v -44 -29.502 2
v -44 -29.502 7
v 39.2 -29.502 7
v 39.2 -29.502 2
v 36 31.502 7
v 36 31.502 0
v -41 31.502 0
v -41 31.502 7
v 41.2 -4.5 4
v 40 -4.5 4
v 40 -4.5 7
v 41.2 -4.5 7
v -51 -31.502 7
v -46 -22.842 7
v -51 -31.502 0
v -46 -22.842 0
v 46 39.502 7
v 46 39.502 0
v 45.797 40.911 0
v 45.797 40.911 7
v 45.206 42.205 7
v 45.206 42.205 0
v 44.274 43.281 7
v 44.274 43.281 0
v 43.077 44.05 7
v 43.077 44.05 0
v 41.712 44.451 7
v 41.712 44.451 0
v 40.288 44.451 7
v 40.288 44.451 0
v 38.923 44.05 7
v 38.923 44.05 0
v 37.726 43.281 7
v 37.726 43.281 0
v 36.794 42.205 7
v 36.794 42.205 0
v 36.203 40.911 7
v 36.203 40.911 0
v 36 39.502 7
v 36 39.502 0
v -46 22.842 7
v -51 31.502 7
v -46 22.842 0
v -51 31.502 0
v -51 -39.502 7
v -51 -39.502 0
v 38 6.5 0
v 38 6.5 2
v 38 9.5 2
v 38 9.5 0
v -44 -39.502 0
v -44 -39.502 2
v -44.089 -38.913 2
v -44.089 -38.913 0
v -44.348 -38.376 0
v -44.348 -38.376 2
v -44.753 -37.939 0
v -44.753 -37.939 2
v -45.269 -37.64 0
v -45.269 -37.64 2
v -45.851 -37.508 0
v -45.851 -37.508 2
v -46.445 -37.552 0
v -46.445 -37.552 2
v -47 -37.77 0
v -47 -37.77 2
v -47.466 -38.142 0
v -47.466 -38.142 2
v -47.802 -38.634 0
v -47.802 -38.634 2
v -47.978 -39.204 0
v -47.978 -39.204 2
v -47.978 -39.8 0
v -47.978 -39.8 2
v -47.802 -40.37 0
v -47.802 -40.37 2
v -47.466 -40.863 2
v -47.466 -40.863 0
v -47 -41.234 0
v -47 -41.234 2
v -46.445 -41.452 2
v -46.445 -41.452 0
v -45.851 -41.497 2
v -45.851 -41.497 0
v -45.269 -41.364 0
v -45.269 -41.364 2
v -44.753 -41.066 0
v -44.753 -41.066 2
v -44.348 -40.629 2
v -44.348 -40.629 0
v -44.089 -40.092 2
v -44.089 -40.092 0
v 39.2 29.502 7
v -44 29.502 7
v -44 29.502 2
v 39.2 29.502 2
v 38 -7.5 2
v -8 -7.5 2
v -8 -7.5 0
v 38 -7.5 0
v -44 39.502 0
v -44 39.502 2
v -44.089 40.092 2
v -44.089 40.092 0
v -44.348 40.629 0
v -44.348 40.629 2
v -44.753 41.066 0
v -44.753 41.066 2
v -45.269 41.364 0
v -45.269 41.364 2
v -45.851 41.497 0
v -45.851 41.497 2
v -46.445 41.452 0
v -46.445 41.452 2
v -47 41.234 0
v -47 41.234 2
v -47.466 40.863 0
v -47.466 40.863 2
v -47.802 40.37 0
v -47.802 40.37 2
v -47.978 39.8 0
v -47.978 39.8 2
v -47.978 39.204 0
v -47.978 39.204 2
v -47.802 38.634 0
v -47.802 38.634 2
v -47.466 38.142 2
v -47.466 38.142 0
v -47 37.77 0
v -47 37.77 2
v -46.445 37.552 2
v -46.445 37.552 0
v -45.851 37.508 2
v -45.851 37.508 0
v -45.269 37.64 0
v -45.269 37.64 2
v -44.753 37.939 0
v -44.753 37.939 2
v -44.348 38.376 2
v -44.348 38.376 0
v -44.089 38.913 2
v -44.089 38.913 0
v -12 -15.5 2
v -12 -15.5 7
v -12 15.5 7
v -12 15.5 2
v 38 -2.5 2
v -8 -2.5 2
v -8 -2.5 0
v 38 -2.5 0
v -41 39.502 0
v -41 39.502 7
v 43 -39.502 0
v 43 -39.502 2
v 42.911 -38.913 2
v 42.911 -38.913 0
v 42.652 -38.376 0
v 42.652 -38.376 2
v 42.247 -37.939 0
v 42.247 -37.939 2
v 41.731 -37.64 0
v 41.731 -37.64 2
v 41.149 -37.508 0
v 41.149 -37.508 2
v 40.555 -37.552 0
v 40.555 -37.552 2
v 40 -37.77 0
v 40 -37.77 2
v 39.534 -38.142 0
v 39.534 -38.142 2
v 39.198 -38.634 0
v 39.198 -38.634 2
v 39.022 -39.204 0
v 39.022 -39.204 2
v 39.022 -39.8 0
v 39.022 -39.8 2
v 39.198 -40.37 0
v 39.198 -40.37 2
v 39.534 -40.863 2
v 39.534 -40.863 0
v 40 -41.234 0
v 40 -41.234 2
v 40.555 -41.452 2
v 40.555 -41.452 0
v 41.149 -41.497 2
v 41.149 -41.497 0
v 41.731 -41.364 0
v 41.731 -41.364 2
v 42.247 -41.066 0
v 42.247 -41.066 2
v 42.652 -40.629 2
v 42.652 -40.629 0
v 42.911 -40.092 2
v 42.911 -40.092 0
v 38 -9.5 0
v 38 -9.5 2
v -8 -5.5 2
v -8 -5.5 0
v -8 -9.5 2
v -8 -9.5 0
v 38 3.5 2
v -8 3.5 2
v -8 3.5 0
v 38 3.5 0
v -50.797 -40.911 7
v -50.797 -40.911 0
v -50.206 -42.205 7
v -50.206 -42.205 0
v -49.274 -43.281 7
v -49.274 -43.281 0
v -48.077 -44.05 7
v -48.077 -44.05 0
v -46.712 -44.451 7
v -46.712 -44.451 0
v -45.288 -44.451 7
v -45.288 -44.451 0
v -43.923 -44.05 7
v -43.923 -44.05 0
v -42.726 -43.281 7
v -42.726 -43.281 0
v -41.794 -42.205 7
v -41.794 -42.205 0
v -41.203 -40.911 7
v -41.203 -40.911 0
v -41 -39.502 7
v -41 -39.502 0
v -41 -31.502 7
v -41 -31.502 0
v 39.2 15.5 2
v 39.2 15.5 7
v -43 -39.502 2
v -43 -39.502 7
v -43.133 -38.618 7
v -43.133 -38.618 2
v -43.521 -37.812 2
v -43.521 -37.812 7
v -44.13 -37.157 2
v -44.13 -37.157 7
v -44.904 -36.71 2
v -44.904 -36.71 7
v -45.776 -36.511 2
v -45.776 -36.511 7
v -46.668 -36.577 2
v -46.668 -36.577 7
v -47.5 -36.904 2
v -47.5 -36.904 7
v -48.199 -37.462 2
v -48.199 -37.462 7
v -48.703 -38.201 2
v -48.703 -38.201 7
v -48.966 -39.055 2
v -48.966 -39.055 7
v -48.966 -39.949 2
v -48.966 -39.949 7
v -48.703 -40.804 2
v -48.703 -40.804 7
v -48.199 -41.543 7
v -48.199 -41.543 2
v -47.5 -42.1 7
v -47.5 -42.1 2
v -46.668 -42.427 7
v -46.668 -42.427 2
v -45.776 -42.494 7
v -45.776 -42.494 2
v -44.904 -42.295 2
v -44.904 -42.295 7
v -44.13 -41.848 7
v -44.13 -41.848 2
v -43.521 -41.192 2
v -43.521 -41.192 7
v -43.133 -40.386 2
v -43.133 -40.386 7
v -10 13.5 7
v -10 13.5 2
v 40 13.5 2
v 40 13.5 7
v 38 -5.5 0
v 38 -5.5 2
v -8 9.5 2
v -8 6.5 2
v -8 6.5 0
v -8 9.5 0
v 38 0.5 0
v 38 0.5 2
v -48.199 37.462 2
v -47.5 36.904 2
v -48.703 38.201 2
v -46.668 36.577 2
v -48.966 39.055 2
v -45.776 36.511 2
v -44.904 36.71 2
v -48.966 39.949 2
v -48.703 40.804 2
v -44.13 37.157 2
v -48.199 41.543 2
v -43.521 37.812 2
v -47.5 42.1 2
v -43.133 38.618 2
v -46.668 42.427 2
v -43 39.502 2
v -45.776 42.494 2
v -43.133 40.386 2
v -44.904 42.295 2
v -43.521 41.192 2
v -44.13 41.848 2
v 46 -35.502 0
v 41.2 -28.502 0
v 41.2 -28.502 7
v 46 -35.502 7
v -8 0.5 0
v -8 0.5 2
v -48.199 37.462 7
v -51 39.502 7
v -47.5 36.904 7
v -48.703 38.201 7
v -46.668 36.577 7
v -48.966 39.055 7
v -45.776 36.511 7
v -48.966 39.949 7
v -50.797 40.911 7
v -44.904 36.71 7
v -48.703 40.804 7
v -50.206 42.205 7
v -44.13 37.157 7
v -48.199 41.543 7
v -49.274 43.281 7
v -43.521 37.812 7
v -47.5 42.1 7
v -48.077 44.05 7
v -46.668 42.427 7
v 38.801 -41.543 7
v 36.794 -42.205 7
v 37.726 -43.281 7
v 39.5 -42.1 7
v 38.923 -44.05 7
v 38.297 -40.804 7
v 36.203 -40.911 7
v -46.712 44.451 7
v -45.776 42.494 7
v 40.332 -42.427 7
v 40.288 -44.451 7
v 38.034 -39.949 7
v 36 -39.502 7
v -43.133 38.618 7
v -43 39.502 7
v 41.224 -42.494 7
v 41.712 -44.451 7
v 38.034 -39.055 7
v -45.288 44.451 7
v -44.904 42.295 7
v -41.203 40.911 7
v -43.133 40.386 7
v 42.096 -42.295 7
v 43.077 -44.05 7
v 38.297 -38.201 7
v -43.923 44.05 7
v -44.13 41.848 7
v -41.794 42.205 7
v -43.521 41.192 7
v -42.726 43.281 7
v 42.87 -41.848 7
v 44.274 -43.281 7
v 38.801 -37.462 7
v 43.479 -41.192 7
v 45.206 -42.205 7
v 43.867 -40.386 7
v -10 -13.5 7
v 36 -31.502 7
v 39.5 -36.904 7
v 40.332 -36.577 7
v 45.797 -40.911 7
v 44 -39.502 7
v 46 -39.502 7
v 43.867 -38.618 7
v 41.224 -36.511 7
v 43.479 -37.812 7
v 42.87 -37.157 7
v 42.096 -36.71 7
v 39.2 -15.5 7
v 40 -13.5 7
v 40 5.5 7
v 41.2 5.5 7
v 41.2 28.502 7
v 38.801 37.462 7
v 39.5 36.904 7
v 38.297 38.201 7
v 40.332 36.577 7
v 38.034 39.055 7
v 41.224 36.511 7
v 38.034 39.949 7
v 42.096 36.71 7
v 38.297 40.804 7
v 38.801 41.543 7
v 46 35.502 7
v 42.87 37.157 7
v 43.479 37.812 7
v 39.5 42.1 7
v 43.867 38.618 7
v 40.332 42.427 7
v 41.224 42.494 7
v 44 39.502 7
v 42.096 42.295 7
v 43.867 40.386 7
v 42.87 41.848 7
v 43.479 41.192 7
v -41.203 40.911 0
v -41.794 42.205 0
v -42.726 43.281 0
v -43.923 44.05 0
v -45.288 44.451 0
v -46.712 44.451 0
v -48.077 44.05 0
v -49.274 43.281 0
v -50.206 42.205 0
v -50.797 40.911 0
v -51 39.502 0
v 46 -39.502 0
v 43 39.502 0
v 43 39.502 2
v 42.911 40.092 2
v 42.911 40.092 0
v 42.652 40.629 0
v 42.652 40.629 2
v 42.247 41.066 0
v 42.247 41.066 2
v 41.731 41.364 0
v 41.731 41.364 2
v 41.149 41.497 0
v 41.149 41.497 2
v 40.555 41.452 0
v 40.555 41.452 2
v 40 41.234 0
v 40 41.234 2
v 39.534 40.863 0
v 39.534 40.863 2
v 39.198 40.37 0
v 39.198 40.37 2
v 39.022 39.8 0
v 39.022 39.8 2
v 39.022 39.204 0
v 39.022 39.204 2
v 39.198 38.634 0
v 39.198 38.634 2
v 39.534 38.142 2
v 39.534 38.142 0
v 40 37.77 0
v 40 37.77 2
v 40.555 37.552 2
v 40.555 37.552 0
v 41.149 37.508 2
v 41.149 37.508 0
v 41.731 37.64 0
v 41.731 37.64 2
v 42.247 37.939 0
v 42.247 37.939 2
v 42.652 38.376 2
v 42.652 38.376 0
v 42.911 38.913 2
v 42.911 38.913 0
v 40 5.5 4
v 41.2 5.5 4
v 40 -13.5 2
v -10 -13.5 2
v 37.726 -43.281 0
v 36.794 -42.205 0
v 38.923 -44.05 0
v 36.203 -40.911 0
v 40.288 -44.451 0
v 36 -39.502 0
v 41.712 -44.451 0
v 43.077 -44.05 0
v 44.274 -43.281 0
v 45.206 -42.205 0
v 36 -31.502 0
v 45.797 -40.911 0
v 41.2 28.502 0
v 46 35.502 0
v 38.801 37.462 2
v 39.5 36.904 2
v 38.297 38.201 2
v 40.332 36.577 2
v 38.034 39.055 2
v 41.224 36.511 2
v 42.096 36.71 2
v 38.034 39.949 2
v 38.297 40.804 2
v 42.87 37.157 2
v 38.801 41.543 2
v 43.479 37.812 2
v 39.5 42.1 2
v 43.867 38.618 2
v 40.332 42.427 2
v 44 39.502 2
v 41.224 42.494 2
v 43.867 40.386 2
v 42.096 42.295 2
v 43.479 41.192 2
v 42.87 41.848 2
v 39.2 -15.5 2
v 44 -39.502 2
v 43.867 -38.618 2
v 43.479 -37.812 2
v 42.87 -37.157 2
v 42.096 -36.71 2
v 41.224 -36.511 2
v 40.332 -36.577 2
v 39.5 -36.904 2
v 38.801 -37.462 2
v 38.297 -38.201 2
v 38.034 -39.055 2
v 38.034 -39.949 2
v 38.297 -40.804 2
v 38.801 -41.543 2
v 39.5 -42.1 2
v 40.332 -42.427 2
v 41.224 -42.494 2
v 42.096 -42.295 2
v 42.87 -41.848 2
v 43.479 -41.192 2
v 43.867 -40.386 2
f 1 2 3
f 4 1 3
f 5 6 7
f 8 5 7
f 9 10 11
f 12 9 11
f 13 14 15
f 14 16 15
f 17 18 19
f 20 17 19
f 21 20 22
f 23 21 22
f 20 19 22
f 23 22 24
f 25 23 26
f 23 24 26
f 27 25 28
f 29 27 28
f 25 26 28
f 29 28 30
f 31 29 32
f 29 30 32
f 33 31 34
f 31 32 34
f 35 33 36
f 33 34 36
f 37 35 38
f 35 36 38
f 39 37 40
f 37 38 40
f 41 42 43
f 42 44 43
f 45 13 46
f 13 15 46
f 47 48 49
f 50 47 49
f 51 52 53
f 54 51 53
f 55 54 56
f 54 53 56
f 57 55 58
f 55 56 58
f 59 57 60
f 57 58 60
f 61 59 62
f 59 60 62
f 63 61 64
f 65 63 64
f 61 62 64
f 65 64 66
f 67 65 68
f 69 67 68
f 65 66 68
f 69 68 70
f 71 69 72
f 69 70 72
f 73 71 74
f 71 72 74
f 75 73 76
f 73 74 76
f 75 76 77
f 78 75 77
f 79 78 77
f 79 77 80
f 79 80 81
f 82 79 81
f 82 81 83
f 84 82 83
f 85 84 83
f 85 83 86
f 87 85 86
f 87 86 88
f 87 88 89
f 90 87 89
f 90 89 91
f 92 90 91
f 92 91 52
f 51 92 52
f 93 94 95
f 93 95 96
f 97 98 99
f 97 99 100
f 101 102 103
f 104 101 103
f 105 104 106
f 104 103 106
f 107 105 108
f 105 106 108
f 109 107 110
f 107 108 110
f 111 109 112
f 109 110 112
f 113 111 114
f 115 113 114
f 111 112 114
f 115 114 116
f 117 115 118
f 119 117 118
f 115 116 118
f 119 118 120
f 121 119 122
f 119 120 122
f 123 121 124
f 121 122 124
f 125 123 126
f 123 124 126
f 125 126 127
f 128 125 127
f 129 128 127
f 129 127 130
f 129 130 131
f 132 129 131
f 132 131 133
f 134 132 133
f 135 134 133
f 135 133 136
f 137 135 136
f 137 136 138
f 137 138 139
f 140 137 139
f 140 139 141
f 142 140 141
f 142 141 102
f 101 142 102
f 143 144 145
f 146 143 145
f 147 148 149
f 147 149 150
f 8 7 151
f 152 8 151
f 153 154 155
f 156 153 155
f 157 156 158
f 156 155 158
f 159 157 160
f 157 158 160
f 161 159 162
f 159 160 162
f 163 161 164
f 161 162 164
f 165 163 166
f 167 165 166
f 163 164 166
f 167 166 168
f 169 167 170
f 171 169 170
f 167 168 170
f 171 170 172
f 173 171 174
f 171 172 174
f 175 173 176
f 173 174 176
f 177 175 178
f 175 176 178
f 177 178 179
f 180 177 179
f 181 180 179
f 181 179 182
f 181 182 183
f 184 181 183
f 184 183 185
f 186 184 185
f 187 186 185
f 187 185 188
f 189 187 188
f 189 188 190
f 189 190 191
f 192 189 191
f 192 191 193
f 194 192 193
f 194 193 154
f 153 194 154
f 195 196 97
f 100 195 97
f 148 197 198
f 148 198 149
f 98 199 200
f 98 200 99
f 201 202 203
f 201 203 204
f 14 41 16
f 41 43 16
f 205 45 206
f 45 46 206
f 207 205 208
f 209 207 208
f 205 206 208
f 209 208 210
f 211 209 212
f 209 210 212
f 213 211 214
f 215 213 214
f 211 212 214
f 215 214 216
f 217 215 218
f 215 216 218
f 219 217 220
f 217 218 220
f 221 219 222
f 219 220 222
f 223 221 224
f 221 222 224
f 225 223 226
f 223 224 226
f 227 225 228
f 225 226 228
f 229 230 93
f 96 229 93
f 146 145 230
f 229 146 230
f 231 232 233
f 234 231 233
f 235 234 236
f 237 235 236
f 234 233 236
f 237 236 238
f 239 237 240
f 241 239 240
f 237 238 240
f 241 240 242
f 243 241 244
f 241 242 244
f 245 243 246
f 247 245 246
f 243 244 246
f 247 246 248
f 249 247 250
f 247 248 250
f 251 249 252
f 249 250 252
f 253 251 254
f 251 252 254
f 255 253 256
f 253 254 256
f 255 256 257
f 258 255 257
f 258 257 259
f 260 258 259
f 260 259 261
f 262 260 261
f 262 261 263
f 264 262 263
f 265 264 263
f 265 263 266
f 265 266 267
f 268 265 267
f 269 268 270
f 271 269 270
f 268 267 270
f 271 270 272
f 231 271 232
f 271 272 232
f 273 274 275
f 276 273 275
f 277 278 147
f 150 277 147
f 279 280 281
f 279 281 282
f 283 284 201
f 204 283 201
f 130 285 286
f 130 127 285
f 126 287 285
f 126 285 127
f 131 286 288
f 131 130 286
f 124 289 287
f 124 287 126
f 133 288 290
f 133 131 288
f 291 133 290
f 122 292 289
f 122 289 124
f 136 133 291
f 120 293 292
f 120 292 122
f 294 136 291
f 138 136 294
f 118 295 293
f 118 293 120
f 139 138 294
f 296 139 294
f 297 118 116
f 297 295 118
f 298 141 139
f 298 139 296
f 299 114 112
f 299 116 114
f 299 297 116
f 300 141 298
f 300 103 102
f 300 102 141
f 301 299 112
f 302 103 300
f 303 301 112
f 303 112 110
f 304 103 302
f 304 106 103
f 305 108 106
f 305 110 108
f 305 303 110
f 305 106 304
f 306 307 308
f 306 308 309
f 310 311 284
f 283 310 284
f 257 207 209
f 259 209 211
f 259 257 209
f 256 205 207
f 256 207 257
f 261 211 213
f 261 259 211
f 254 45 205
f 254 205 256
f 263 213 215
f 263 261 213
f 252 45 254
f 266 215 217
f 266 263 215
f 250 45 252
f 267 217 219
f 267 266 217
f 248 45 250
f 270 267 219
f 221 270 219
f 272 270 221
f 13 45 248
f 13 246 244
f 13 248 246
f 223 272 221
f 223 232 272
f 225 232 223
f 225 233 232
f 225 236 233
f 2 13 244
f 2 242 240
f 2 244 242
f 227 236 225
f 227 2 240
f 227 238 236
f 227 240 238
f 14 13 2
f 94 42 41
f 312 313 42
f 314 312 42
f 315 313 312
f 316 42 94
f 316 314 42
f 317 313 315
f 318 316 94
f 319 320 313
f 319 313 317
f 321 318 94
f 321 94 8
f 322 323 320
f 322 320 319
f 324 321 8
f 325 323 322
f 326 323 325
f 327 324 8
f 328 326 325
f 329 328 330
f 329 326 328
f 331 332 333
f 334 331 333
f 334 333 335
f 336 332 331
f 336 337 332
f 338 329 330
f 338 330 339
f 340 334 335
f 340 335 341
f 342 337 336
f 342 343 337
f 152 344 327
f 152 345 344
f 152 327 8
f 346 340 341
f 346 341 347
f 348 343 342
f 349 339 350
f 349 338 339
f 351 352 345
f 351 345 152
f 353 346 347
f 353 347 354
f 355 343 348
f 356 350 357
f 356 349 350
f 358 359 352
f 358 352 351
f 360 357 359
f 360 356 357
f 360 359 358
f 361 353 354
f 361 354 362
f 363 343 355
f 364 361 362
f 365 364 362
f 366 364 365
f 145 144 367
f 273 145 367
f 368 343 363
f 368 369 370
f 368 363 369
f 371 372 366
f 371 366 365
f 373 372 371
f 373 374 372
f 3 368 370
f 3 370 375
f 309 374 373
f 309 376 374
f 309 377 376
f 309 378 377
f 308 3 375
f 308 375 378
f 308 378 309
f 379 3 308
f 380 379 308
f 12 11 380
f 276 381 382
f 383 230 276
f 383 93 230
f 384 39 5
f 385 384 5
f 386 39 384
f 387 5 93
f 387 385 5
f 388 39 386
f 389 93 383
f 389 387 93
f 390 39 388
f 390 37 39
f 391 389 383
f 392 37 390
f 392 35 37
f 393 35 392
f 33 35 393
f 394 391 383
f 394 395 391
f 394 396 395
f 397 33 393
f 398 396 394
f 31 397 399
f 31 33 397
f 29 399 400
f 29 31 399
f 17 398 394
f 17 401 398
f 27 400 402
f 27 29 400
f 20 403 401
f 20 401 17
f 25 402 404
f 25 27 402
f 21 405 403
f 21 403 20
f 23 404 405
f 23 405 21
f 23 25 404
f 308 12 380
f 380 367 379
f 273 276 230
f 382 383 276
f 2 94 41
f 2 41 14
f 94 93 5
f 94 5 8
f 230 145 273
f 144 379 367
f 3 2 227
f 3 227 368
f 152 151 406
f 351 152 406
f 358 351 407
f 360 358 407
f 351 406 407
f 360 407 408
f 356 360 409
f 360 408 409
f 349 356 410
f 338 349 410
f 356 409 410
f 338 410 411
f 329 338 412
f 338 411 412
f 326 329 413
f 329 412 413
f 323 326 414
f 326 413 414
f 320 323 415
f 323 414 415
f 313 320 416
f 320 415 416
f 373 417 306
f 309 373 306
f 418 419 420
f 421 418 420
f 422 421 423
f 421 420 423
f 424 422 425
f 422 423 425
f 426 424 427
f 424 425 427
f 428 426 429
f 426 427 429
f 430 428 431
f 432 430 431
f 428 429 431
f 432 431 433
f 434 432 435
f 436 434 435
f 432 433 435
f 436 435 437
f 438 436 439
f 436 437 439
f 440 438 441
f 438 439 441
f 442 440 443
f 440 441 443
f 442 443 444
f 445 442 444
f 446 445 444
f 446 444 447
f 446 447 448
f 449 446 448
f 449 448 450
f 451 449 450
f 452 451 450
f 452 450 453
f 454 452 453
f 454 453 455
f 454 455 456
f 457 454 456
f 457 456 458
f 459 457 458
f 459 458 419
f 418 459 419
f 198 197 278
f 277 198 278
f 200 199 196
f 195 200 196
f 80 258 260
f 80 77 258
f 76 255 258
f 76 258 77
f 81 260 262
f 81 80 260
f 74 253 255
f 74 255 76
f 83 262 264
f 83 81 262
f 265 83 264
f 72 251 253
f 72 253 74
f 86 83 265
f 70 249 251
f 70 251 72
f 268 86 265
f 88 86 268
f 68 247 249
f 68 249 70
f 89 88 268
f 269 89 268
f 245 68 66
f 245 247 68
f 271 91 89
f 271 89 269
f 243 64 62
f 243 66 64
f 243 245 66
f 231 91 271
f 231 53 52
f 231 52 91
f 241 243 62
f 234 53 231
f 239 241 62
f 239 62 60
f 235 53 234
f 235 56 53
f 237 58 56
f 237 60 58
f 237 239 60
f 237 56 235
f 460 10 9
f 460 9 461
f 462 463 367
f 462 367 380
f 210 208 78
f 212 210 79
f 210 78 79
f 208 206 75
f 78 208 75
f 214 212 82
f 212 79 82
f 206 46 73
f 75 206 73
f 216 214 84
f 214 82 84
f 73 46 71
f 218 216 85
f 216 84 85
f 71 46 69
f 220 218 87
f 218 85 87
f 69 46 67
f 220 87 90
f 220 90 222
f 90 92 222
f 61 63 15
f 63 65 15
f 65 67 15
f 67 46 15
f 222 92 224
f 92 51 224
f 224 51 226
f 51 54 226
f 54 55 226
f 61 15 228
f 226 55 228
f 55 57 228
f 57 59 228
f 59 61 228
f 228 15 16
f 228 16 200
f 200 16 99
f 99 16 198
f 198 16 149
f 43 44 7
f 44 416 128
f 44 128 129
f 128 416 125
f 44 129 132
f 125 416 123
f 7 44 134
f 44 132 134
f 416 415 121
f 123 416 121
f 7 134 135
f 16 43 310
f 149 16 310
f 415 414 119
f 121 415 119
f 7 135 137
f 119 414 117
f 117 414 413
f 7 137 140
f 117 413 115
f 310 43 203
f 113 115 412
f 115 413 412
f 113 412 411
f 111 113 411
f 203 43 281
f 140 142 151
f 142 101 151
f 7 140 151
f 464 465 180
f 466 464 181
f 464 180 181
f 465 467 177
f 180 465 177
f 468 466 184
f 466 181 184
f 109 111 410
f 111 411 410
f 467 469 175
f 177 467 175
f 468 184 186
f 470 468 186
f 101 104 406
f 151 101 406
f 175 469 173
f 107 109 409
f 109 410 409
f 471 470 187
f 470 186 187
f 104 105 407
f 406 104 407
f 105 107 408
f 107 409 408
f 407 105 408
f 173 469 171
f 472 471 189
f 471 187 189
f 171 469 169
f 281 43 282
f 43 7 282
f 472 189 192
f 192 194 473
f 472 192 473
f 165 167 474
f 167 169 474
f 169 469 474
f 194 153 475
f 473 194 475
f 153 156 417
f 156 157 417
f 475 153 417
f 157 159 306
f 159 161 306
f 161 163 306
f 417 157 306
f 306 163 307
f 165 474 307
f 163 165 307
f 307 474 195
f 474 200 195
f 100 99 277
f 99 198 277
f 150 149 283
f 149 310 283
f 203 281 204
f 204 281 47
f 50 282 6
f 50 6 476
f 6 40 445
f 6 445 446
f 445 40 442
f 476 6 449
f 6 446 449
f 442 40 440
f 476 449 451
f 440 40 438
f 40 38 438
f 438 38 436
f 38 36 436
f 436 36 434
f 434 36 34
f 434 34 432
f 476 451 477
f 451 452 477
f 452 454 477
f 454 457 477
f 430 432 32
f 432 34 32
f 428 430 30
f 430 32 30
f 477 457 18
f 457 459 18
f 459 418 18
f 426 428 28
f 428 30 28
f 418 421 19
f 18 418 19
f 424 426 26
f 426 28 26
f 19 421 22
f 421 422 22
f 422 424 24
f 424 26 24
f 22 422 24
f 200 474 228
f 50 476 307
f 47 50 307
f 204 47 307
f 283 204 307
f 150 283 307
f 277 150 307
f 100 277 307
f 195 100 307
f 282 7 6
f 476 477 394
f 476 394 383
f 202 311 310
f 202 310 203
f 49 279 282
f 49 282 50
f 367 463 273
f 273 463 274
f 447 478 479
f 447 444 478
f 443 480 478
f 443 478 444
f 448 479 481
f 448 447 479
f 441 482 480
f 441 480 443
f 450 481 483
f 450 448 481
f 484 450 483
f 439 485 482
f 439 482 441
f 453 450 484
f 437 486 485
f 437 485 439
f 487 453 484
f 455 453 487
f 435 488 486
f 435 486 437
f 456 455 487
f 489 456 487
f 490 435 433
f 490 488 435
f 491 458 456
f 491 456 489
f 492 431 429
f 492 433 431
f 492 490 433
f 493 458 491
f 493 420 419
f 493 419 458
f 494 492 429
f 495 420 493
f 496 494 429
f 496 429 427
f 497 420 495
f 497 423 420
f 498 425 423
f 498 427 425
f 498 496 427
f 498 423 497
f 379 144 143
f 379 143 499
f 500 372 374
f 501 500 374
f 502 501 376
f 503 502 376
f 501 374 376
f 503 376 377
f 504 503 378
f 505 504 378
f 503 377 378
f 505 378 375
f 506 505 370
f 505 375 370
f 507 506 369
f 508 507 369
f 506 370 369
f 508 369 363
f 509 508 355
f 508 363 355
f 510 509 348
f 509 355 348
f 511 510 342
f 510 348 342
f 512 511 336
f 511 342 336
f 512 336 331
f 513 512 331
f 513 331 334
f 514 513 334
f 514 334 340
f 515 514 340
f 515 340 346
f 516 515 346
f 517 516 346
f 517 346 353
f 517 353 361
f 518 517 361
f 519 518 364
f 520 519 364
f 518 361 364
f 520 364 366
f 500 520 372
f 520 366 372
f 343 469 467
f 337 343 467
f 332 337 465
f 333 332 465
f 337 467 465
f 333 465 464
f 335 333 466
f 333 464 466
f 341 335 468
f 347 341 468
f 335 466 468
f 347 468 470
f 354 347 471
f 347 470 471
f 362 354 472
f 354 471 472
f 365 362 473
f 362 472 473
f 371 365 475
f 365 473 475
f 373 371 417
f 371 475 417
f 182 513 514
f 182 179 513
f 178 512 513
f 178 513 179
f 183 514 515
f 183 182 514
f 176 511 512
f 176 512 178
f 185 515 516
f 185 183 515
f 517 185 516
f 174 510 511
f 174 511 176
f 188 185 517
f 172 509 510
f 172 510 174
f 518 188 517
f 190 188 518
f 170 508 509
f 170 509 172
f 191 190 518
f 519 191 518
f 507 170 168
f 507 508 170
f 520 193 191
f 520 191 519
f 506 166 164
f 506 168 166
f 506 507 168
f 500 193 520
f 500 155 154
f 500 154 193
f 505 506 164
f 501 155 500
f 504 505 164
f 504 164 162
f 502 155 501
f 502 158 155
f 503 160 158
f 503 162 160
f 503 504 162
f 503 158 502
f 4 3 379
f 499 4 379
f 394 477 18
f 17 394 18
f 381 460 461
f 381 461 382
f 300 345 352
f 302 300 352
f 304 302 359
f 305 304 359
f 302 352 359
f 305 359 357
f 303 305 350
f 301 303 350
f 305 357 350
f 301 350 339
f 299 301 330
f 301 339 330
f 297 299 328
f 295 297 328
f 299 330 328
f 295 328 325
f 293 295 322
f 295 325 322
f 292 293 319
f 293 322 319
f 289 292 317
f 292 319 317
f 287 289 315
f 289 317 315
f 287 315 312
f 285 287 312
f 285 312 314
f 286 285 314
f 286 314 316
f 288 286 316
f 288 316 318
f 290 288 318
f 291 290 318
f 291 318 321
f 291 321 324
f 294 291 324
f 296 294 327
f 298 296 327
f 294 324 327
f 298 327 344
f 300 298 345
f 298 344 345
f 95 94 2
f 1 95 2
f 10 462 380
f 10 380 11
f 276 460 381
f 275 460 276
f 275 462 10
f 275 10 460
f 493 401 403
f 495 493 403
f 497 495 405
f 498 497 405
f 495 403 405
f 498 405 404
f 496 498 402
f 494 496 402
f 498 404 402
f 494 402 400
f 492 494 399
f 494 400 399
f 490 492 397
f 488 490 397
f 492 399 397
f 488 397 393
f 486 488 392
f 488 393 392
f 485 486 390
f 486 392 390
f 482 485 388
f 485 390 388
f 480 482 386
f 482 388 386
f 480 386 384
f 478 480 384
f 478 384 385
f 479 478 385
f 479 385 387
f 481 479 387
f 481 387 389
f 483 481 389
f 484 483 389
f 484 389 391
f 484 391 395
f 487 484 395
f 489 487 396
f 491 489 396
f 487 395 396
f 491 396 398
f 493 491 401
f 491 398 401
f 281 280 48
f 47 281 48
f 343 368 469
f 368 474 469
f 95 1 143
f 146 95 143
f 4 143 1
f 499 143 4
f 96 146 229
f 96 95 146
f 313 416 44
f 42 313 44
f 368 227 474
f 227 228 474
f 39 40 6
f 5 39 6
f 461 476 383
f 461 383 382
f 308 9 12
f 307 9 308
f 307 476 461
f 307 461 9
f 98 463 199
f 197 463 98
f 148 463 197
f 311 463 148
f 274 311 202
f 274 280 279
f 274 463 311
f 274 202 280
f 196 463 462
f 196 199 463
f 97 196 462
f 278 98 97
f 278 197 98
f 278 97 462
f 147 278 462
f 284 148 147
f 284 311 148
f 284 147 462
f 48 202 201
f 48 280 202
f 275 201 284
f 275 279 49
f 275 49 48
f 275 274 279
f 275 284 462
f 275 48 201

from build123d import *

# Parameters (mm, degrees)
EXTRUDE_1_DEPTH     = 2
SKETCH_3_W          = 50
SKETCH_3_H          = 27
EXTRUDE_2_DEPTH     = 5
SKETCH_5_R          = 3
CUT_EXTRUDE_1_DEPTH = 5
SKETCH_6_W          = 3
SKETCH_6_H          = 10
CUT_EXTRUDE_2_DEPTH = 102.540368708
CUT_EXTRUDE_START   = -7
CUT_EXTRUDE_5_DEPTH = 7
SKETCH_9_W          = 83.2
SKETCH_9_H          = 14.002207555
SKETCH_9_W_2        = 32
SKETCH_9_H_2        = 31
CUT_EXTRUDE_6_DEPTH = 5
SKETCH_11_W         = 46
SKETCH_11_H         = 3
SKETCH_11_H_2       = 2
CUT_EXTRUDE_8_DEPTH = 10
SKETCH_14_R         = 2
CUT_EXTRUDE_9_DEPTH = 10


# Read off the part's stored shape, not the designer's step: the extrude step
with BuildPart() as part:
    # 草图1 → 凸台-拉伸1 (new body)
    with BuildSketch(Plane.XY):
        with BuildLine():
            Line((-46, 22.841953517), (-46, -22.841953517))
            Line((-46, -22.841953517), (-51, -31.502207555))
            Line((-51, -31.502207555), (-51, -39.502207555))
            ThreePointArc((-51, -39.502207555), (-46, -44.502207555), (-41, -39.502207555))
            Line((-41, -39.502207555), (-41, -31.502207555))
            Line((-41, -31.502207555), (36, -31.502207555))
            Line((36, -31.502207555), (36, -39.502207555))
            ThreePointArc((36, -39.502207555), (41, -44.502207555), (46, -39.502207555))
            Line((46, -39.502207555), (46, 39.502207555))
            ThreePointArc((46, 39.502207555), (41, 44.502207555), (36, 39.502207555))
            Line((36, 39.502207555), (36, 31.502207555))
            Line((36, 31.502207555), (-41, 31.502207555))
            Line((-41, 31.502207555), (-41, 39.502207555))
            ThreePointArc((-41, 39.502207555), (-46, 44.502207555), (-51, 39.502207555))
            Line((-51, 39.502207555), (-51, 31.502207555))
            Line((-51, 31.502207555), (-46, 22.841953517))
        make_face()
    extrude(amount=EXTRUDE_1_DEPTH)

    # 草图3 → 凸台-拉伸2 (add)
    with BuildSketch(Plane.XY.offset(2)):
        with BuildLine():
            Line((-51, 39.502207555), (-51, 31.502207555))
            Line((-51, 31.502207555), (-46, 22.841953517))
            Line((-46, 22.841953517), (-46, -22.841953517))
            Line((-46, -22.841953517), (-51, -31.502207555))
            Line((-51, -31.502207555), (-51, -39.502207555))
            ThreePointArc((-51, -39.502207555), (-46, -44.502207555), (-41, -39.502207555))
            Line((-41, -39.502207555), (-41, -31.502207555))
            Line((-41, -31.502207555), (36, -31.502207555))
            Line((36, -31.502207555), (36, -39.502207555))
            ThreePointArc((36, -39.502207555), (41, -44.502207555), (46, -39.502207555))
            Line((46, -39.502207555), (46, 39.502207555))
            ThreePointArc((46, 39.502207555), (41, 44.502207555), (36, 39.502207555))
            Line((36, 39.502207555), (36, 31.502207555))
            Line((36, 31.502207555), (-41, 31.502207555))
            Line((-41, 31.502207555), (-41, 39.502207555))
            ThreePointArc((-41, 39.502207555), (-46, 44.502207555), (-51, 39.502207555))
        make_face()
        with Locations((15, 0)):
            Rectangle(SKETCH_3_W, SKETCH_3_H, mode=Mode.SUBTRACT)
    extrude(amount=EXTRUDE_2_DEPTH)

    # 草图5 → 切除-拉伸1 (cut)
    with BuildSketch(Plane.XY.offset(7)):
        with Locations((41, 39.502207555)):
            Circle(SKETCH_5_R)
        with Locations((-46, 39.502207555)):
            Circle(SKETCH_5_R)
        with Locations((41, -39.502207555)):
            Circle(SKETCH_5_R)
        with Locations((-46, -39.502207555)):
            Circle(SKETCH_5_R)
    extrude(amount=-CUT_EXTRUDE_1_DEPTH, mode=Mode.SUBTRACT)

    # 草图6 → 切除-拉伸2 (cut, through all)
    with BuildSketch(Plane.ZY.offset(-40)):
        with Locations((5.5, 0.5)):
            Rectangle(SKETCH_6_W, SKETCH_6_H)
    extrude(amount=-CUT_EXTRUDE_2_DEPTH, mode=Mode.SUBTRACT)

    # 切除-拉伸5 outline → 切除-拉伸5 (cut)
    with BuildSketch(Plane.XY.offset(7).offset(CUT_EXTRUDE_START)):
        Polygon((46, 35.502207555), (41.2, 28.502207555), (41.2, -28.502207555), (46, -35.502207555), align=None)
    extrude(amount=CUT_EXTRUDE_5_DEPTH, mode=Mode.SUBTRACT)

    # 草图9 → 切除-拉伸6 (cut)
    with BuildSketch(Plane.XY.offset(7)):
        with Locations((-2.4, 22.501103778)):
            Rectangle(SKETCH_9_W, SKETCH_9_H)
        with Locations((-2.4, -22.501103778)):
            Rectangle(SKETCH_9_W, SKETCH_9_H)
        with Locations((-28, 0)):
            Rectangle(SKETCH_9_W_2, SKETCH_9_H_2)
    extrude(amount=-CUT_EXTRUDE_6_DEPTH, mode=Mode.SUBTRACT)

    # 草图11 → 切除-拉伸8 (cut)
    with BuildSketch(Plane.XY.offset(2)):
        with Locations((15, 8)):
            Rectangle(SKETCH_11_W, SKETCH_11_H)
        with Locations((15, 2)):
            Rectangle(SKETCH_11_W, SKETCH_11_H)
        with Locations((15, -4)):
            Rectangle(SKETCH_11_W, SKETCH_11_H)
        with Locations((15, -8.5)):
            Rectangle(SKETCH_11_W, SKETCH_11_H_2)
    extrude(amount=-CUT_EXTRUDE_8_DEPTH, mode=Mode.SUBTRACT)

    # 草图14 → 切除-拉伸9 (cut)
    with BuildSketch(Plane.XY.offset(2)):
        with Locations((41, -39.502207555)):
            Circle(SKETCH_14_R)
        with Locations((41, 39.502207555)):
            Circle(SKETCH_14_R)
        with Locations((-46, 39.502207555)):
            Circle(SKETCH_14_R)
        with Locations((-46, -39.502207555)):
            Circle(SKETCH_14_R)
    extrude(amount=-CUT_EXTRUDE_9_DEPTH, mode=Mode.SUBTRACT)


solid = part.part
